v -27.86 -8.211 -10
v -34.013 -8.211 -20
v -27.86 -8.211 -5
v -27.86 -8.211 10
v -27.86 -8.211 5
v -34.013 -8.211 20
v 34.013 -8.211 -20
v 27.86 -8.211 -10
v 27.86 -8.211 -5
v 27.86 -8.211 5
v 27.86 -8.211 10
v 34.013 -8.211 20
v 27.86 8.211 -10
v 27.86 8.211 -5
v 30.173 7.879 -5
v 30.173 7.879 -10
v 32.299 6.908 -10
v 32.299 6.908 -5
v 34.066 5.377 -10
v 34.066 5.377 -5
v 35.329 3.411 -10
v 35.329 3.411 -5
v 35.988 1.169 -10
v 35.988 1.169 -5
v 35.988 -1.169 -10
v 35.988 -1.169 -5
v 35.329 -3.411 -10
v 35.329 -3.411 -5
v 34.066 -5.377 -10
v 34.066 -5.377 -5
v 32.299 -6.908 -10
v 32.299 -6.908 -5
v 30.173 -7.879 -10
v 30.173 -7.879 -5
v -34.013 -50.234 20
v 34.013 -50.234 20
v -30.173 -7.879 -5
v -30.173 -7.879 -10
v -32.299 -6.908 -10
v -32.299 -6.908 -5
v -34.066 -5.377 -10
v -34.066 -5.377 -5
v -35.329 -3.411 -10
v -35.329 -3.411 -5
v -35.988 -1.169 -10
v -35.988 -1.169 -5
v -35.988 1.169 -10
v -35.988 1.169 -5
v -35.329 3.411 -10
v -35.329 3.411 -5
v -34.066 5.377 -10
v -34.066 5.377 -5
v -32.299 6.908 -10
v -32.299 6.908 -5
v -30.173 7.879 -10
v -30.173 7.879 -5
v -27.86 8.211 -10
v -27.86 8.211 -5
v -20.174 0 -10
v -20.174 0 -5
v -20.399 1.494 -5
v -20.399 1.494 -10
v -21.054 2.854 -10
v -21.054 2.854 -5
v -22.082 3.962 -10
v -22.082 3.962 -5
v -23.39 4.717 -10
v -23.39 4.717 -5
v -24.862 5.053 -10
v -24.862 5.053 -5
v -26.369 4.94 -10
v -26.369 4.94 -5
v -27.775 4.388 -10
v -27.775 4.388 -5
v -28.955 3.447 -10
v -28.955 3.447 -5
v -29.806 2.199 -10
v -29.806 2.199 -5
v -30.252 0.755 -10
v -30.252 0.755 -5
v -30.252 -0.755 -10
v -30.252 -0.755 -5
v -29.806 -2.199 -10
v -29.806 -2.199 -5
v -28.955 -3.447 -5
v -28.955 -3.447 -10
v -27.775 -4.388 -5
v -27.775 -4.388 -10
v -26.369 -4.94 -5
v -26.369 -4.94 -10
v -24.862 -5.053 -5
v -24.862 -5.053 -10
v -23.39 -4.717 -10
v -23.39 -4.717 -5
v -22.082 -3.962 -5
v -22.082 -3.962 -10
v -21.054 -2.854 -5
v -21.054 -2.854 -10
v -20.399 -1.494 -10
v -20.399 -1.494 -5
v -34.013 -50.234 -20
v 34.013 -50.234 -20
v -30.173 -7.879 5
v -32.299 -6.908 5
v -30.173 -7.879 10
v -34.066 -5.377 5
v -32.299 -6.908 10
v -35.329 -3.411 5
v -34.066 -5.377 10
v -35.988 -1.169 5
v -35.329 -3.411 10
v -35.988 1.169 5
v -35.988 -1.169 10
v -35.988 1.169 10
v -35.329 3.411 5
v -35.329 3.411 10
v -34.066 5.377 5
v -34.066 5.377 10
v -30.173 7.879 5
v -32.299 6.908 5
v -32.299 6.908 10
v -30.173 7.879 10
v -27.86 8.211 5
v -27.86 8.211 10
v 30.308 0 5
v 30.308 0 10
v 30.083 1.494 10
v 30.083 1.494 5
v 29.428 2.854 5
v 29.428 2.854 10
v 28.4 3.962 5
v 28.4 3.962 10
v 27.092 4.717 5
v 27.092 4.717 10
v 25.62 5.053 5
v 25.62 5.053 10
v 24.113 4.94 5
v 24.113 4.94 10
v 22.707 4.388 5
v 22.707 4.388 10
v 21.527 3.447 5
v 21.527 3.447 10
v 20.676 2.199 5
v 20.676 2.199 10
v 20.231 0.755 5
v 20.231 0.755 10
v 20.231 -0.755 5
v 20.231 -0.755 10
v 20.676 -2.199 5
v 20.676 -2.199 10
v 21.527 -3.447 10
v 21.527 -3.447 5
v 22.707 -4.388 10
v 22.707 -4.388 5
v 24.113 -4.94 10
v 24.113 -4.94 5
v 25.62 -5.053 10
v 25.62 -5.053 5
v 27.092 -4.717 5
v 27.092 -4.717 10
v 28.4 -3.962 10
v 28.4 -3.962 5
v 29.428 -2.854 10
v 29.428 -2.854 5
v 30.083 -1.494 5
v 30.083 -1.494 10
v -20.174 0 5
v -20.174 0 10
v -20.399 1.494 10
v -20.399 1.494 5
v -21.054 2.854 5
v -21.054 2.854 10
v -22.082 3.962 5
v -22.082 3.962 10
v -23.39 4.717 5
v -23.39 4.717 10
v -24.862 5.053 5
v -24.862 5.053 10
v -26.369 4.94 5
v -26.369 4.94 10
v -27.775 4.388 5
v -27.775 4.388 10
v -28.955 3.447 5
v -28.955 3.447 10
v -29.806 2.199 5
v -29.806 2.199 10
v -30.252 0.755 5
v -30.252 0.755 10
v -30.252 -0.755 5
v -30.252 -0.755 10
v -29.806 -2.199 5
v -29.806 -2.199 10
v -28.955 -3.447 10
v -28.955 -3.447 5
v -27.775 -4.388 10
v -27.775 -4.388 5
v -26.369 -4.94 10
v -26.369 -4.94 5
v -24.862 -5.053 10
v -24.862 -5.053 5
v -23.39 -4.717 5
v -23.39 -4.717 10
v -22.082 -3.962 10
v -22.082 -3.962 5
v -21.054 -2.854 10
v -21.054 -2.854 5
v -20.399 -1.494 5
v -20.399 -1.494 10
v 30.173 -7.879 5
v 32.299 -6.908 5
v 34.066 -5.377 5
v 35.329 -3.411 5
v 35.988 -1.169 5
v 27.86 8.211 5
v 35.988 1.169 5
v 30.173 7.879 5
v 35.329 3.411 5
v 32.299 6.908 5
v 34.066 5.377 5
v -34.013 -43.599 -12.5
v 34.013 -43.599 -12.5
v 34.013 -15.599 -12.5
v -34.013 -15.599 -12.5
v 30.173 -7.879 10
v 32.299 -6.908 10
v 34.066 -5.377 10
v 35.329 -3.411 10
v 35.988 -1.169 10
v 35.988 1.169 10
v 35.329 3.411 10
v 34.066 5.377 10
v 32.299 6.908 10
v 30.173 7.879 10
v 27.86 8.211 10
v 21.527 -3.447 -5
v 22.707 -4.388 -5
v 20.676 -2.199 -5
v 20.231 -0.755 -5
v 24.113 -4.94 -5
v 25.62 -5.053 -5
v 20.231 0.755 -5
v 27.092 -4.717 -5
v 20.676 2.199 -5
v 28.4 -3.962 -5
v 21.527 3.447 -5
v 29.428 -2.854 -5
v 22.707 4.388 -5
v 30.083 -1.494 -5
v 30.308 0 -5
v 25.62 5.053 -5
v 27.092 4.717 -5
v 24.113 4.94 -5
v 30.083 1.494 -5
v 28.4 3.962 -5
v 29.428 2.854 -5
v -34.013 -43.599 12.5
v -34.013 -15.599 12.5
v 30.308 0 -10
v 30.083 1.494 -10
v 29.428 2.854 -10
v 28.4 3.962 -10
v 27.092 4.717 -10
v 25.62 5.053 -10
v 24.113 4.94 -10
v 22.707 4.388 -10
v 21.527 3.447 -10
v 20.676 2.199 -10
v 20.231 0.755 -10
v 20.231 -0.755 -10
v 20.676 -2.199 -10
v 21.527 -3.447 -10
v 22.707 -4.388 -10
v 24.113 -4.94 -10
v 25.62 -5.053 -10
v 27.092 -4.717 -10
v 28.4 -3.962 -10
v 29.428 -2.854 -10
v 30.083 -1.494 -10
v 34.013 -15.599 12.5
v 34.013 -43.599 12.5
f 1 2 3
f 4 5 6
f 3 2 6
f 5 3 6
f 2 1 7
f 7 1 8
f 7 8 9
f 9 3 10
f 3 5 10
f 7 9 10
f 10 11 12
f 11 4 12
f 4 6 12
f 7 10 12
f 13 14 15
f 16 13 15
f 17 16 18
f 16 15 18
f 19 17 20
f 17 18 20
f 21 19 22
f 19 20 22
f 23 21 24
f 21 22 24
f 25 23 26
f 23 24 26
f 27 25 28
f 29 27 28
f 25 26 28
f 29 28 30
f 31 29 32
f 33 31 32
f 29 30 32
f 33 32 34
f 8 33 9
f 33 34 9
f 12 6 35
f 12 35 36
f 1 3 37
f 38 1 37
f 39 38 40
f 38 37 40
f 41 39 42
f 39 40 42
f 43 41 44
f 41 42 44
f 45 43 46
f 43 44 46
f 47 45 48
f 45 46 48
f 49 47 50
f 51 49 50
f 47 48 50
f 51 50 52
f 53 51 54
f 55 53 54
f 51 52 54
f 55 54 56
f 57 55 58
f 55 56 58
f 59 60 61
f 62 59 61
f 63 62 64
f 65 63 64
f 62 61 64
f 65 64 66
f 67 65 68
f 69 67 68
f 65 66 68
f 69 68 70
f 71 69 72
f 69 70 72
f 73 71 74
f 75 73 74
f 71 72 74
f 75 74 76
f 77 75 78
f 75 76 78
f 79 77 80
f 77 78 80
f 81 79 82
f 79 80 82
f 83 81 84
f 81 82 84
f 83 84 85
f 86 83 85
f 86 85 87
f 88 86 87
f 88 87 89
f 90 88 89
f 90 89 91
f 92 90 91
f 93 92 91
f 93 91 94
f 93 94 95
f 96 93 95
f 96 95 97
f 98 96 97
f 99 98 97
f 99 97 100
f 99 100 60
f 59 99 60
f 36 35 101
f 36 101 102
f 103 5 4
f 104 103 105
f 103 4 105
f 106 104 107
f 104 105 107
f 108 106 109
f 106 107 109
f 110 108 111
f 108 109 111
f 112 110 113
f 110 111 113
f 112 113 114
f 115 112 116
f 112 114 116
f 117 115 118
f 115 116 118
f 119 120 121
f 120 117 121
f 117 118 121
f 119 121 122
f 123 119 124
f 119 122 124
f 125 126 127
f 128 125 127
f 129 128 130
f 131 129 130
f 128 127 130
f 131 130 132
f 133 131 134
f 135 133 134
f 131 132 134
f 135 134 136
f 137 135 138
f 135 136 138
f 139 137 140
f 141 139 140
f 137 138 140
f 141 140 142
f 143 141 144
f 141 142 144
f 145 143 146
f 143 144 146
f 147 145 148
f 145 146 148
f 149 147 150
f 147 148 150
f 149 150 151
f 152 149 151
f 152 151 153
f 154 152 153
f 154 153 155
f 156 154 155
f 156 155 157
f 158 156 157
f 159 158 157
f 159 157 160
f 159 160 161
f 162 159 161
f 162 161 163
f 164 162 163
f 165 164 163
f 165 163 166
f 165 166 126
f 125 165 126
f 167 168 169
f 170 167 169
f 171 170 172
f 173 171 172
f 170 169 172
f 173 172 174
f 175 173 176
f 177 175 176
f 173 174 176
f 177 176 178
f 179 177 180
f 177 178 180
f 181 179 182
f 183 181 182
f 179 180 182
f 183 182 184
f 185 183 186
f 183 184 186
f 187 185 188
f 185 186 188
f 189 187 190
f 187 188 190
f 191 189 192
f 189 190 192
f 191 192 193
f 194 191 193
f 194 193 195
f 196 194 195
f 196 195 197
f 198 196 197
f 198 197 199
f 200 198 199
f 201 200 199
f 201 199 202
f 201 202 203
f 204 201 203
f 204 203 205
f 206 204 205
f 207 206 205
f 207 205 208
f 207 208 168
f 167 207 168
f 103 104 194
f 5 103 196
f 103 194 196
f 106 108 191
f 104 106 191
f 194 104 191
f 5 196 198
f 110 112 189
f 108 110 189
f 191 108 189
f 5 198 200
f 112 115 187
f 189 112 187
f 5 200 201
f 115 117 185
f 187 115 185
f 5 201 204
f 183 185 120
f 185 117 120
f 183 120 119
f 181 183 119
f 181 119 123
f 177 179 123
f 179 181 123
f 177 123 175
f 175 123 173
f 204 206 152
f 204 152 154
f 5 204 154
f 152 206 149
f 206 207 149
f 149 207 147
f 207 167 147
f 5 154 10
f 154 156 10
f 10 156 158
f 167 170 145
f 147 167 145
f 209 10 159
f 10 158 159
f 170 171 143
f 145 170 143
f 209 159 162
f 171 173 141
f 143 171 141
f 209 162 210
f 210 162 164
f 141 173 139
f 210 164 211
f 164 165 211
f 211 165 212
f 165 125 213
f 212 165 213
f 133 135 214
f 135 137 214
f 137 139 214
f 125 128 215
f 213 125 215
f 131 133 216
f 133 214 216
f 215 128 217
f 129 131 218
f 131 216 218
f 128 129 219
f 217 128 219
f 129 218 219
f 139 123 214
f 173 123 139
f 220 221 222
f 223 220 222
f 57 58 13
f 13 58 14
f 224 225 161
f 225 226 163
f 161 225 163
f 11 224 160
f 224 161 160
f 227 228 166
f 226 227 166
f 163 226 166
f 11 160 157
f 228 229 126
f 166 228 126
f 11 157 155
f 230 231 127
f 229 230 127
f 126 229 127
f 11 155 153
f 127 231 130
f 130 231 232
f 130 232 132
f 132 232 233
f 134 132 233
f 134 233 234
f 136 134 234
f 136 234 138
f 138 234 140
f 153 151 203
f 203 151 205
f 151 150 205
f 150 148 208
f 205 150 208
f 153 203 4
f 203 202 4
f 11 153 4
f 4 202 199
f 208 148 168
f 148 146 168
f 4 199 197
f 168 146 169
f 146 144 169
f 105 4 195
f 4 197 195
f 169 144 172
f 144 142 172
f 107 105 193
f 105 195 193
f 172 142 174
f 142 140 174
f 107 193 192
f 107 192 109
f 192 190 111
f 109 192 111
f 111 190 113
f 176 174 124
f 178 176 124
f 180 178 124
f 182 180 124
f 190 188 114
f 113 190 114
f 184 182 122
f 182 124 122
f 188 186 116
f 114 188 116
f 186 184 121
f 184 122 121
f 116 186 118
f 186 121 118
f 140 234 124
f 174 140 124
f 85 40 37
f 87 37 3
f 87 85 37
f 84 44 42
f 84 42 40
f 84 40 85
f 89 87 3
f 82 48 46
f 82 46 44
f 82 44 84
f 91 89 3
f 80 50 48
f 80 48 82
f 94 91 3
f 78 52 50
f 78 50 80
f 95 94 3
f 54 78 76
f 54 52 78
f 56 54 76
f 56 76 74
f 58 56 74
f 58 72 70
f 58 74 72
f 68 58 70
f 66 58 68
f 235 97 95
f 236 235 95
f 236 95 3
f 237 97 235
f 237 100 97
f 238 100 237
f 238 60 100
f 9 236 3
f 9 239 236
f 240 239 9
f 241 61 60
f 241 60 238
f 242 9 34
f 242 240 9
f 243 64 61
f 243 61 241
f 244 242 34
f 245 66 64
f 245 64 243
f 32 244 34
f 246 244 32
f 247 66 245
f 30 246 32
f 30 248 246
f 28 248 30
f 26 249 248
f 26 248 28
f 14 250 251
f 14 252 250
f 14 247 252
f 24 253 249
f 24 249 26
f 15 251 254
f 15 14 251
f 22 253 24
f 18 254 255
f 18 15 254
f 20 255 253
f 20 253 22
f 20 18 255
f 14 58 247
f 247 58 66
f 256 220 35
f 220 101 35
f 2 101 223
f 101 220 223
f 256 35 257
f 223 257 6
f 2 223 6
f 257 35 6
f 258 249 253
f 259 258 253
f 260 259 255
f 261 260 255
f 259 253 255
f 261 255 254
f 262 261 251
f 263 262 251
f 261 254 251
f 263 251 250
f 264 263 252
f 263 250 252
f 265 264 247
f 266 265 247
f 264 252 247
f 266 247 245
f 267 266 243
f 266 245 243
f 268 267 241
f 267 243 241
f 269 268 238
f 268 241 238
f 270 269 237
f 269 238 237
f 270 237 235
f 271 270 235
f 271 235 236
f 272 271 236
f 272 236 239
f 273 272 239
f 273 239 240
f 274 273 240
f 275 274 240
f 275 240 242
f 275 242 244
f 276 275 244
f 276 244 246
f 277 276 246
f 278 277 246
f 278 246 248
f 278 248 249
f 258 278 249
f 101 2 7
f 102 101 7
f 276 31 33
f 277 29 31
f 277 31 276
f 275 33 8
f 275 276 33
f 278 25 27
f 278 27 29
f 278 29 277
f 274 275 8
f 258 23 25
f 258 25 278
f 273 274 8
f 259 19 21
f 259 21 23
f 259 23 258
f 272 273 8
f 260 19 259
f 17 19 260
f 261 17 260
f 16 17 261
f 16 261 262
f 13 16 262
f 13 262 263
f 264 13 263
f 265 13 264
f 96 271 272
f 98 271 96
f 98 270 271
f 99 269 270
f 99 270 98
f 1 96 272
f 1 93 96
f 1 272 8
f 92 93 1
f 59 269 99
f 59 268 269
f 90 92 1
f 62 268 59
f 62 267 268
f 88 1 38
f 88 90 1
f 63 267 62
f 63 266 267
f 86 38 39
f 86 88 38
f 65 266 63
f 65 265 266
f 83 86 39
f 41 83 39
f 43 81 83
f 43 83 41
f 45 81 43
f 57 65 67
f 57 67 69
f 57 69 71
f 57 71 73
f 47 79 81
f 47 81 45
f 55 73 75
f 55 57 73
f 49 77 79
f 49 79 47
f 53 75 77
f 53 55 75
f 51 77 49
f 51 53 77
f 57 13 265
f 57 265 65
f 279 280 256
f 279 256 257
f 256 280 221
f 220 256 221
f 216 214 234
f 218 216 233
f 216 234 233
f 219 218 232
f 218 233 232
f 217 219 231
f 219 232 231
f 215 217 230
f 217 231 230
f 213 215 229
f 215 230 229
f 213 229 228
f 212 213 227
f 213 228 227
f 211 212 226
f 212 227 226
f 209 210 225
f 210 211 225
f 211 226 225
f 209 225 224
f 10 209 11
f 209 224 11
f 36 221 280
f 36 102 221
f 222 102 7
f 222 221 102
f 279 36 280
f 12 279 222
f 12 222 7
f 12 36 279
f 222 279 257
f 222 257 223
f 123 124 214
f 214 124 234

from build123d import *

# Parameters (mm, degrees)
BOSS_EXTRUDE1_DEPTH = 10
SKETCH3_W           = 68.02674373
SKETCH3_H           = 42.022590527
BOSS_EXTRUDE2_DEPTH = 20
SKETCH4_W           = 25
SKETCH4_H           = 28
CUT_EXTRUDE1_DEPTH  = 71.084609616
SKETCH5_R           = 5.067107297
CUT_EXTRUDE2_DEPTH  = 31
SKETCH6_W           = 166.597833244
SKETCH6_H           = 42.962518472
CUT_EXTRUDE3_DEPTH  = 5


with BuildPart() as part:
    # Sketch1 → Boss-Extrude1 (new body, symmetric)
    with BuildSketch(Plane.XY):
        with BuildLine():
            Line((-27.860019642, 8.21121811), (27.860019642, 8.21121811))
            ThreePointArc((27.860019642, 8.21121811), (36.071237751, 0), (27.860019642, -8.21121811))
            Line((27.860019642, -8.21121811), (-27.860019642, -8.21121811))
            ThreePointArc((-27.860019642, -8.21121811), (-36.071237751, 0), (-27.860019642, 8.21121811))
        make_face()
    extrude(amount=BOSS_EXTRUDE1_DEPTH, both=True)

    # Sketch3 → Boss-Extrude2 (add, symmetric)
    with BuildSketch(Plane.XY):
        with Locations((0, -29.222513374)):
            Rectangle(SKETCH3_W, SKETCH3_H)
    extrude(amount=BOSS_EXTRUDE2_DEPTH, both=True)

    # Sketch4 → Cut-Extrude1 (cut, through all)
    with BuildSketch(Plane(origin=(34.013371865, 0, 0), x_dir=(0, 0, -1), z_dir=(1, 0, 0))):
        with Locations((0, -29.598628357)):
            Rectangle(SKETCH4_W, SKETCH4_H)
    extrude(amount=-CUT_EXTRUDE1_DEPTH, mode=Mode.SUBTRACT)

    # Sketch5 → Cut-Extrude2 (cut, through all)
    with BuildSketch(Plane.XY.offset(10)):
        with Locations((-25.241020996, 0)):
            Circle(SKETCH5_R)
        with Locations((25.241020996, 0)):
            Circle(SKETCH5_R)
    extrude(amount=-CUT_EXTRUDE2_DEPTH, mode=Mode.SUBTRACT)

    # Sketch6 → Cut-Extrude3 (cut, symmetric)
    with BuildSketch(Plane.XY):
        with Locations((0.75044069, 13.270041126)):
            Rectangle(SKETCH6_W, SKETCH6_H)
    extrude(amount=CUT_EXTRUDE3_DEPTH, both=True, mode=Mode.SUBTRACT)


solid = part.part
